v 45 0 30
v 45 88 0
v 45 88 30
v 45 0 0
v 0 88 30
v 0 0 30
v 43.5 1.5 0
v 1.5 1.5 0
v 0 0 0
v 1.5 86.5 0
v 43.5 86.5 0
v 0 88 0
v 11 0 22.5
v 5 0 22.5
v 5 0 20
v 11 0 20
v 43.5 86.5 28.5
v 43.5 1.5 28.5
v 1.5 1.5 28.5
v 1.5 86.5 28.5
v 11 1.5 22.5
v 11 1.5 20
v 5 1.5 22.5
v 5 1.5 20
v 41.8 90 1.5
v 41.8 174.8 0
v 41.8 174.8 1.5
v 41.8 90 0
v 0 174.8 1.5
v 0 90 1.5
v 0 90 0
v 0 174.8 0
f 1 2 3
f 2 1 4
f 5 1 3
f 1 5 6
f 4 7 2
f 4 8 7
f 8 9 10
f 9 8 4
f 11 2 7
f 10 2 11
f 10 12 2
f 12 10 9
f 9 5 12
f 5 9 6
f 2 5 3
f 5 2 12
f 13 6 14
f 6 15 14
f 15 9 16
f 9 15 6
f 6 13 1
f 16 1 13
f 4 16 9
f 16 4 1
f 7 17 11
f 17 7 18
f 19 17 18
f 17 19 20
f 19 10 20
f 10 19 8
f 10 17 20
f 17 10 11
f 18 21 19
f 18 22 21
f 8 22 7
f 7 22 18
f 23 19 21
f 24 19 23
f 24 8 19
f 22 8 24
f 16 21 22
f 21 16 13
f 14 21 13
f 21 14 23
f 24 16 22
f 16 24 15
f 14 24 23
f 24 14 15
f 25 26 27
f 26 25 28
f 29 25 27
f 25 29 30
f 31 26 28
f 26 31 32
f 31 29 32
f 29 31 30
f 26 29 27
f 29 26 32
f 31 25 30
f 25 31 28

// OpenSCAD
difference() {

        difference() {
            cube([45, 88, 30], center=false);
                translate([1.5, 1.5, -1.5]) {
                    cube([42, 85, 30], center=false);
            }
            translate([5,0,20]) {
                cube([6, 4, 2.5], center=false);
            }
            translate([48,0,20]) {
                cube([6, 4, 2], center=false);
            }
        }

}

translate([0, 90, 0]) {
    cube([41.8, 84.8, 1.5], center=false);
}
